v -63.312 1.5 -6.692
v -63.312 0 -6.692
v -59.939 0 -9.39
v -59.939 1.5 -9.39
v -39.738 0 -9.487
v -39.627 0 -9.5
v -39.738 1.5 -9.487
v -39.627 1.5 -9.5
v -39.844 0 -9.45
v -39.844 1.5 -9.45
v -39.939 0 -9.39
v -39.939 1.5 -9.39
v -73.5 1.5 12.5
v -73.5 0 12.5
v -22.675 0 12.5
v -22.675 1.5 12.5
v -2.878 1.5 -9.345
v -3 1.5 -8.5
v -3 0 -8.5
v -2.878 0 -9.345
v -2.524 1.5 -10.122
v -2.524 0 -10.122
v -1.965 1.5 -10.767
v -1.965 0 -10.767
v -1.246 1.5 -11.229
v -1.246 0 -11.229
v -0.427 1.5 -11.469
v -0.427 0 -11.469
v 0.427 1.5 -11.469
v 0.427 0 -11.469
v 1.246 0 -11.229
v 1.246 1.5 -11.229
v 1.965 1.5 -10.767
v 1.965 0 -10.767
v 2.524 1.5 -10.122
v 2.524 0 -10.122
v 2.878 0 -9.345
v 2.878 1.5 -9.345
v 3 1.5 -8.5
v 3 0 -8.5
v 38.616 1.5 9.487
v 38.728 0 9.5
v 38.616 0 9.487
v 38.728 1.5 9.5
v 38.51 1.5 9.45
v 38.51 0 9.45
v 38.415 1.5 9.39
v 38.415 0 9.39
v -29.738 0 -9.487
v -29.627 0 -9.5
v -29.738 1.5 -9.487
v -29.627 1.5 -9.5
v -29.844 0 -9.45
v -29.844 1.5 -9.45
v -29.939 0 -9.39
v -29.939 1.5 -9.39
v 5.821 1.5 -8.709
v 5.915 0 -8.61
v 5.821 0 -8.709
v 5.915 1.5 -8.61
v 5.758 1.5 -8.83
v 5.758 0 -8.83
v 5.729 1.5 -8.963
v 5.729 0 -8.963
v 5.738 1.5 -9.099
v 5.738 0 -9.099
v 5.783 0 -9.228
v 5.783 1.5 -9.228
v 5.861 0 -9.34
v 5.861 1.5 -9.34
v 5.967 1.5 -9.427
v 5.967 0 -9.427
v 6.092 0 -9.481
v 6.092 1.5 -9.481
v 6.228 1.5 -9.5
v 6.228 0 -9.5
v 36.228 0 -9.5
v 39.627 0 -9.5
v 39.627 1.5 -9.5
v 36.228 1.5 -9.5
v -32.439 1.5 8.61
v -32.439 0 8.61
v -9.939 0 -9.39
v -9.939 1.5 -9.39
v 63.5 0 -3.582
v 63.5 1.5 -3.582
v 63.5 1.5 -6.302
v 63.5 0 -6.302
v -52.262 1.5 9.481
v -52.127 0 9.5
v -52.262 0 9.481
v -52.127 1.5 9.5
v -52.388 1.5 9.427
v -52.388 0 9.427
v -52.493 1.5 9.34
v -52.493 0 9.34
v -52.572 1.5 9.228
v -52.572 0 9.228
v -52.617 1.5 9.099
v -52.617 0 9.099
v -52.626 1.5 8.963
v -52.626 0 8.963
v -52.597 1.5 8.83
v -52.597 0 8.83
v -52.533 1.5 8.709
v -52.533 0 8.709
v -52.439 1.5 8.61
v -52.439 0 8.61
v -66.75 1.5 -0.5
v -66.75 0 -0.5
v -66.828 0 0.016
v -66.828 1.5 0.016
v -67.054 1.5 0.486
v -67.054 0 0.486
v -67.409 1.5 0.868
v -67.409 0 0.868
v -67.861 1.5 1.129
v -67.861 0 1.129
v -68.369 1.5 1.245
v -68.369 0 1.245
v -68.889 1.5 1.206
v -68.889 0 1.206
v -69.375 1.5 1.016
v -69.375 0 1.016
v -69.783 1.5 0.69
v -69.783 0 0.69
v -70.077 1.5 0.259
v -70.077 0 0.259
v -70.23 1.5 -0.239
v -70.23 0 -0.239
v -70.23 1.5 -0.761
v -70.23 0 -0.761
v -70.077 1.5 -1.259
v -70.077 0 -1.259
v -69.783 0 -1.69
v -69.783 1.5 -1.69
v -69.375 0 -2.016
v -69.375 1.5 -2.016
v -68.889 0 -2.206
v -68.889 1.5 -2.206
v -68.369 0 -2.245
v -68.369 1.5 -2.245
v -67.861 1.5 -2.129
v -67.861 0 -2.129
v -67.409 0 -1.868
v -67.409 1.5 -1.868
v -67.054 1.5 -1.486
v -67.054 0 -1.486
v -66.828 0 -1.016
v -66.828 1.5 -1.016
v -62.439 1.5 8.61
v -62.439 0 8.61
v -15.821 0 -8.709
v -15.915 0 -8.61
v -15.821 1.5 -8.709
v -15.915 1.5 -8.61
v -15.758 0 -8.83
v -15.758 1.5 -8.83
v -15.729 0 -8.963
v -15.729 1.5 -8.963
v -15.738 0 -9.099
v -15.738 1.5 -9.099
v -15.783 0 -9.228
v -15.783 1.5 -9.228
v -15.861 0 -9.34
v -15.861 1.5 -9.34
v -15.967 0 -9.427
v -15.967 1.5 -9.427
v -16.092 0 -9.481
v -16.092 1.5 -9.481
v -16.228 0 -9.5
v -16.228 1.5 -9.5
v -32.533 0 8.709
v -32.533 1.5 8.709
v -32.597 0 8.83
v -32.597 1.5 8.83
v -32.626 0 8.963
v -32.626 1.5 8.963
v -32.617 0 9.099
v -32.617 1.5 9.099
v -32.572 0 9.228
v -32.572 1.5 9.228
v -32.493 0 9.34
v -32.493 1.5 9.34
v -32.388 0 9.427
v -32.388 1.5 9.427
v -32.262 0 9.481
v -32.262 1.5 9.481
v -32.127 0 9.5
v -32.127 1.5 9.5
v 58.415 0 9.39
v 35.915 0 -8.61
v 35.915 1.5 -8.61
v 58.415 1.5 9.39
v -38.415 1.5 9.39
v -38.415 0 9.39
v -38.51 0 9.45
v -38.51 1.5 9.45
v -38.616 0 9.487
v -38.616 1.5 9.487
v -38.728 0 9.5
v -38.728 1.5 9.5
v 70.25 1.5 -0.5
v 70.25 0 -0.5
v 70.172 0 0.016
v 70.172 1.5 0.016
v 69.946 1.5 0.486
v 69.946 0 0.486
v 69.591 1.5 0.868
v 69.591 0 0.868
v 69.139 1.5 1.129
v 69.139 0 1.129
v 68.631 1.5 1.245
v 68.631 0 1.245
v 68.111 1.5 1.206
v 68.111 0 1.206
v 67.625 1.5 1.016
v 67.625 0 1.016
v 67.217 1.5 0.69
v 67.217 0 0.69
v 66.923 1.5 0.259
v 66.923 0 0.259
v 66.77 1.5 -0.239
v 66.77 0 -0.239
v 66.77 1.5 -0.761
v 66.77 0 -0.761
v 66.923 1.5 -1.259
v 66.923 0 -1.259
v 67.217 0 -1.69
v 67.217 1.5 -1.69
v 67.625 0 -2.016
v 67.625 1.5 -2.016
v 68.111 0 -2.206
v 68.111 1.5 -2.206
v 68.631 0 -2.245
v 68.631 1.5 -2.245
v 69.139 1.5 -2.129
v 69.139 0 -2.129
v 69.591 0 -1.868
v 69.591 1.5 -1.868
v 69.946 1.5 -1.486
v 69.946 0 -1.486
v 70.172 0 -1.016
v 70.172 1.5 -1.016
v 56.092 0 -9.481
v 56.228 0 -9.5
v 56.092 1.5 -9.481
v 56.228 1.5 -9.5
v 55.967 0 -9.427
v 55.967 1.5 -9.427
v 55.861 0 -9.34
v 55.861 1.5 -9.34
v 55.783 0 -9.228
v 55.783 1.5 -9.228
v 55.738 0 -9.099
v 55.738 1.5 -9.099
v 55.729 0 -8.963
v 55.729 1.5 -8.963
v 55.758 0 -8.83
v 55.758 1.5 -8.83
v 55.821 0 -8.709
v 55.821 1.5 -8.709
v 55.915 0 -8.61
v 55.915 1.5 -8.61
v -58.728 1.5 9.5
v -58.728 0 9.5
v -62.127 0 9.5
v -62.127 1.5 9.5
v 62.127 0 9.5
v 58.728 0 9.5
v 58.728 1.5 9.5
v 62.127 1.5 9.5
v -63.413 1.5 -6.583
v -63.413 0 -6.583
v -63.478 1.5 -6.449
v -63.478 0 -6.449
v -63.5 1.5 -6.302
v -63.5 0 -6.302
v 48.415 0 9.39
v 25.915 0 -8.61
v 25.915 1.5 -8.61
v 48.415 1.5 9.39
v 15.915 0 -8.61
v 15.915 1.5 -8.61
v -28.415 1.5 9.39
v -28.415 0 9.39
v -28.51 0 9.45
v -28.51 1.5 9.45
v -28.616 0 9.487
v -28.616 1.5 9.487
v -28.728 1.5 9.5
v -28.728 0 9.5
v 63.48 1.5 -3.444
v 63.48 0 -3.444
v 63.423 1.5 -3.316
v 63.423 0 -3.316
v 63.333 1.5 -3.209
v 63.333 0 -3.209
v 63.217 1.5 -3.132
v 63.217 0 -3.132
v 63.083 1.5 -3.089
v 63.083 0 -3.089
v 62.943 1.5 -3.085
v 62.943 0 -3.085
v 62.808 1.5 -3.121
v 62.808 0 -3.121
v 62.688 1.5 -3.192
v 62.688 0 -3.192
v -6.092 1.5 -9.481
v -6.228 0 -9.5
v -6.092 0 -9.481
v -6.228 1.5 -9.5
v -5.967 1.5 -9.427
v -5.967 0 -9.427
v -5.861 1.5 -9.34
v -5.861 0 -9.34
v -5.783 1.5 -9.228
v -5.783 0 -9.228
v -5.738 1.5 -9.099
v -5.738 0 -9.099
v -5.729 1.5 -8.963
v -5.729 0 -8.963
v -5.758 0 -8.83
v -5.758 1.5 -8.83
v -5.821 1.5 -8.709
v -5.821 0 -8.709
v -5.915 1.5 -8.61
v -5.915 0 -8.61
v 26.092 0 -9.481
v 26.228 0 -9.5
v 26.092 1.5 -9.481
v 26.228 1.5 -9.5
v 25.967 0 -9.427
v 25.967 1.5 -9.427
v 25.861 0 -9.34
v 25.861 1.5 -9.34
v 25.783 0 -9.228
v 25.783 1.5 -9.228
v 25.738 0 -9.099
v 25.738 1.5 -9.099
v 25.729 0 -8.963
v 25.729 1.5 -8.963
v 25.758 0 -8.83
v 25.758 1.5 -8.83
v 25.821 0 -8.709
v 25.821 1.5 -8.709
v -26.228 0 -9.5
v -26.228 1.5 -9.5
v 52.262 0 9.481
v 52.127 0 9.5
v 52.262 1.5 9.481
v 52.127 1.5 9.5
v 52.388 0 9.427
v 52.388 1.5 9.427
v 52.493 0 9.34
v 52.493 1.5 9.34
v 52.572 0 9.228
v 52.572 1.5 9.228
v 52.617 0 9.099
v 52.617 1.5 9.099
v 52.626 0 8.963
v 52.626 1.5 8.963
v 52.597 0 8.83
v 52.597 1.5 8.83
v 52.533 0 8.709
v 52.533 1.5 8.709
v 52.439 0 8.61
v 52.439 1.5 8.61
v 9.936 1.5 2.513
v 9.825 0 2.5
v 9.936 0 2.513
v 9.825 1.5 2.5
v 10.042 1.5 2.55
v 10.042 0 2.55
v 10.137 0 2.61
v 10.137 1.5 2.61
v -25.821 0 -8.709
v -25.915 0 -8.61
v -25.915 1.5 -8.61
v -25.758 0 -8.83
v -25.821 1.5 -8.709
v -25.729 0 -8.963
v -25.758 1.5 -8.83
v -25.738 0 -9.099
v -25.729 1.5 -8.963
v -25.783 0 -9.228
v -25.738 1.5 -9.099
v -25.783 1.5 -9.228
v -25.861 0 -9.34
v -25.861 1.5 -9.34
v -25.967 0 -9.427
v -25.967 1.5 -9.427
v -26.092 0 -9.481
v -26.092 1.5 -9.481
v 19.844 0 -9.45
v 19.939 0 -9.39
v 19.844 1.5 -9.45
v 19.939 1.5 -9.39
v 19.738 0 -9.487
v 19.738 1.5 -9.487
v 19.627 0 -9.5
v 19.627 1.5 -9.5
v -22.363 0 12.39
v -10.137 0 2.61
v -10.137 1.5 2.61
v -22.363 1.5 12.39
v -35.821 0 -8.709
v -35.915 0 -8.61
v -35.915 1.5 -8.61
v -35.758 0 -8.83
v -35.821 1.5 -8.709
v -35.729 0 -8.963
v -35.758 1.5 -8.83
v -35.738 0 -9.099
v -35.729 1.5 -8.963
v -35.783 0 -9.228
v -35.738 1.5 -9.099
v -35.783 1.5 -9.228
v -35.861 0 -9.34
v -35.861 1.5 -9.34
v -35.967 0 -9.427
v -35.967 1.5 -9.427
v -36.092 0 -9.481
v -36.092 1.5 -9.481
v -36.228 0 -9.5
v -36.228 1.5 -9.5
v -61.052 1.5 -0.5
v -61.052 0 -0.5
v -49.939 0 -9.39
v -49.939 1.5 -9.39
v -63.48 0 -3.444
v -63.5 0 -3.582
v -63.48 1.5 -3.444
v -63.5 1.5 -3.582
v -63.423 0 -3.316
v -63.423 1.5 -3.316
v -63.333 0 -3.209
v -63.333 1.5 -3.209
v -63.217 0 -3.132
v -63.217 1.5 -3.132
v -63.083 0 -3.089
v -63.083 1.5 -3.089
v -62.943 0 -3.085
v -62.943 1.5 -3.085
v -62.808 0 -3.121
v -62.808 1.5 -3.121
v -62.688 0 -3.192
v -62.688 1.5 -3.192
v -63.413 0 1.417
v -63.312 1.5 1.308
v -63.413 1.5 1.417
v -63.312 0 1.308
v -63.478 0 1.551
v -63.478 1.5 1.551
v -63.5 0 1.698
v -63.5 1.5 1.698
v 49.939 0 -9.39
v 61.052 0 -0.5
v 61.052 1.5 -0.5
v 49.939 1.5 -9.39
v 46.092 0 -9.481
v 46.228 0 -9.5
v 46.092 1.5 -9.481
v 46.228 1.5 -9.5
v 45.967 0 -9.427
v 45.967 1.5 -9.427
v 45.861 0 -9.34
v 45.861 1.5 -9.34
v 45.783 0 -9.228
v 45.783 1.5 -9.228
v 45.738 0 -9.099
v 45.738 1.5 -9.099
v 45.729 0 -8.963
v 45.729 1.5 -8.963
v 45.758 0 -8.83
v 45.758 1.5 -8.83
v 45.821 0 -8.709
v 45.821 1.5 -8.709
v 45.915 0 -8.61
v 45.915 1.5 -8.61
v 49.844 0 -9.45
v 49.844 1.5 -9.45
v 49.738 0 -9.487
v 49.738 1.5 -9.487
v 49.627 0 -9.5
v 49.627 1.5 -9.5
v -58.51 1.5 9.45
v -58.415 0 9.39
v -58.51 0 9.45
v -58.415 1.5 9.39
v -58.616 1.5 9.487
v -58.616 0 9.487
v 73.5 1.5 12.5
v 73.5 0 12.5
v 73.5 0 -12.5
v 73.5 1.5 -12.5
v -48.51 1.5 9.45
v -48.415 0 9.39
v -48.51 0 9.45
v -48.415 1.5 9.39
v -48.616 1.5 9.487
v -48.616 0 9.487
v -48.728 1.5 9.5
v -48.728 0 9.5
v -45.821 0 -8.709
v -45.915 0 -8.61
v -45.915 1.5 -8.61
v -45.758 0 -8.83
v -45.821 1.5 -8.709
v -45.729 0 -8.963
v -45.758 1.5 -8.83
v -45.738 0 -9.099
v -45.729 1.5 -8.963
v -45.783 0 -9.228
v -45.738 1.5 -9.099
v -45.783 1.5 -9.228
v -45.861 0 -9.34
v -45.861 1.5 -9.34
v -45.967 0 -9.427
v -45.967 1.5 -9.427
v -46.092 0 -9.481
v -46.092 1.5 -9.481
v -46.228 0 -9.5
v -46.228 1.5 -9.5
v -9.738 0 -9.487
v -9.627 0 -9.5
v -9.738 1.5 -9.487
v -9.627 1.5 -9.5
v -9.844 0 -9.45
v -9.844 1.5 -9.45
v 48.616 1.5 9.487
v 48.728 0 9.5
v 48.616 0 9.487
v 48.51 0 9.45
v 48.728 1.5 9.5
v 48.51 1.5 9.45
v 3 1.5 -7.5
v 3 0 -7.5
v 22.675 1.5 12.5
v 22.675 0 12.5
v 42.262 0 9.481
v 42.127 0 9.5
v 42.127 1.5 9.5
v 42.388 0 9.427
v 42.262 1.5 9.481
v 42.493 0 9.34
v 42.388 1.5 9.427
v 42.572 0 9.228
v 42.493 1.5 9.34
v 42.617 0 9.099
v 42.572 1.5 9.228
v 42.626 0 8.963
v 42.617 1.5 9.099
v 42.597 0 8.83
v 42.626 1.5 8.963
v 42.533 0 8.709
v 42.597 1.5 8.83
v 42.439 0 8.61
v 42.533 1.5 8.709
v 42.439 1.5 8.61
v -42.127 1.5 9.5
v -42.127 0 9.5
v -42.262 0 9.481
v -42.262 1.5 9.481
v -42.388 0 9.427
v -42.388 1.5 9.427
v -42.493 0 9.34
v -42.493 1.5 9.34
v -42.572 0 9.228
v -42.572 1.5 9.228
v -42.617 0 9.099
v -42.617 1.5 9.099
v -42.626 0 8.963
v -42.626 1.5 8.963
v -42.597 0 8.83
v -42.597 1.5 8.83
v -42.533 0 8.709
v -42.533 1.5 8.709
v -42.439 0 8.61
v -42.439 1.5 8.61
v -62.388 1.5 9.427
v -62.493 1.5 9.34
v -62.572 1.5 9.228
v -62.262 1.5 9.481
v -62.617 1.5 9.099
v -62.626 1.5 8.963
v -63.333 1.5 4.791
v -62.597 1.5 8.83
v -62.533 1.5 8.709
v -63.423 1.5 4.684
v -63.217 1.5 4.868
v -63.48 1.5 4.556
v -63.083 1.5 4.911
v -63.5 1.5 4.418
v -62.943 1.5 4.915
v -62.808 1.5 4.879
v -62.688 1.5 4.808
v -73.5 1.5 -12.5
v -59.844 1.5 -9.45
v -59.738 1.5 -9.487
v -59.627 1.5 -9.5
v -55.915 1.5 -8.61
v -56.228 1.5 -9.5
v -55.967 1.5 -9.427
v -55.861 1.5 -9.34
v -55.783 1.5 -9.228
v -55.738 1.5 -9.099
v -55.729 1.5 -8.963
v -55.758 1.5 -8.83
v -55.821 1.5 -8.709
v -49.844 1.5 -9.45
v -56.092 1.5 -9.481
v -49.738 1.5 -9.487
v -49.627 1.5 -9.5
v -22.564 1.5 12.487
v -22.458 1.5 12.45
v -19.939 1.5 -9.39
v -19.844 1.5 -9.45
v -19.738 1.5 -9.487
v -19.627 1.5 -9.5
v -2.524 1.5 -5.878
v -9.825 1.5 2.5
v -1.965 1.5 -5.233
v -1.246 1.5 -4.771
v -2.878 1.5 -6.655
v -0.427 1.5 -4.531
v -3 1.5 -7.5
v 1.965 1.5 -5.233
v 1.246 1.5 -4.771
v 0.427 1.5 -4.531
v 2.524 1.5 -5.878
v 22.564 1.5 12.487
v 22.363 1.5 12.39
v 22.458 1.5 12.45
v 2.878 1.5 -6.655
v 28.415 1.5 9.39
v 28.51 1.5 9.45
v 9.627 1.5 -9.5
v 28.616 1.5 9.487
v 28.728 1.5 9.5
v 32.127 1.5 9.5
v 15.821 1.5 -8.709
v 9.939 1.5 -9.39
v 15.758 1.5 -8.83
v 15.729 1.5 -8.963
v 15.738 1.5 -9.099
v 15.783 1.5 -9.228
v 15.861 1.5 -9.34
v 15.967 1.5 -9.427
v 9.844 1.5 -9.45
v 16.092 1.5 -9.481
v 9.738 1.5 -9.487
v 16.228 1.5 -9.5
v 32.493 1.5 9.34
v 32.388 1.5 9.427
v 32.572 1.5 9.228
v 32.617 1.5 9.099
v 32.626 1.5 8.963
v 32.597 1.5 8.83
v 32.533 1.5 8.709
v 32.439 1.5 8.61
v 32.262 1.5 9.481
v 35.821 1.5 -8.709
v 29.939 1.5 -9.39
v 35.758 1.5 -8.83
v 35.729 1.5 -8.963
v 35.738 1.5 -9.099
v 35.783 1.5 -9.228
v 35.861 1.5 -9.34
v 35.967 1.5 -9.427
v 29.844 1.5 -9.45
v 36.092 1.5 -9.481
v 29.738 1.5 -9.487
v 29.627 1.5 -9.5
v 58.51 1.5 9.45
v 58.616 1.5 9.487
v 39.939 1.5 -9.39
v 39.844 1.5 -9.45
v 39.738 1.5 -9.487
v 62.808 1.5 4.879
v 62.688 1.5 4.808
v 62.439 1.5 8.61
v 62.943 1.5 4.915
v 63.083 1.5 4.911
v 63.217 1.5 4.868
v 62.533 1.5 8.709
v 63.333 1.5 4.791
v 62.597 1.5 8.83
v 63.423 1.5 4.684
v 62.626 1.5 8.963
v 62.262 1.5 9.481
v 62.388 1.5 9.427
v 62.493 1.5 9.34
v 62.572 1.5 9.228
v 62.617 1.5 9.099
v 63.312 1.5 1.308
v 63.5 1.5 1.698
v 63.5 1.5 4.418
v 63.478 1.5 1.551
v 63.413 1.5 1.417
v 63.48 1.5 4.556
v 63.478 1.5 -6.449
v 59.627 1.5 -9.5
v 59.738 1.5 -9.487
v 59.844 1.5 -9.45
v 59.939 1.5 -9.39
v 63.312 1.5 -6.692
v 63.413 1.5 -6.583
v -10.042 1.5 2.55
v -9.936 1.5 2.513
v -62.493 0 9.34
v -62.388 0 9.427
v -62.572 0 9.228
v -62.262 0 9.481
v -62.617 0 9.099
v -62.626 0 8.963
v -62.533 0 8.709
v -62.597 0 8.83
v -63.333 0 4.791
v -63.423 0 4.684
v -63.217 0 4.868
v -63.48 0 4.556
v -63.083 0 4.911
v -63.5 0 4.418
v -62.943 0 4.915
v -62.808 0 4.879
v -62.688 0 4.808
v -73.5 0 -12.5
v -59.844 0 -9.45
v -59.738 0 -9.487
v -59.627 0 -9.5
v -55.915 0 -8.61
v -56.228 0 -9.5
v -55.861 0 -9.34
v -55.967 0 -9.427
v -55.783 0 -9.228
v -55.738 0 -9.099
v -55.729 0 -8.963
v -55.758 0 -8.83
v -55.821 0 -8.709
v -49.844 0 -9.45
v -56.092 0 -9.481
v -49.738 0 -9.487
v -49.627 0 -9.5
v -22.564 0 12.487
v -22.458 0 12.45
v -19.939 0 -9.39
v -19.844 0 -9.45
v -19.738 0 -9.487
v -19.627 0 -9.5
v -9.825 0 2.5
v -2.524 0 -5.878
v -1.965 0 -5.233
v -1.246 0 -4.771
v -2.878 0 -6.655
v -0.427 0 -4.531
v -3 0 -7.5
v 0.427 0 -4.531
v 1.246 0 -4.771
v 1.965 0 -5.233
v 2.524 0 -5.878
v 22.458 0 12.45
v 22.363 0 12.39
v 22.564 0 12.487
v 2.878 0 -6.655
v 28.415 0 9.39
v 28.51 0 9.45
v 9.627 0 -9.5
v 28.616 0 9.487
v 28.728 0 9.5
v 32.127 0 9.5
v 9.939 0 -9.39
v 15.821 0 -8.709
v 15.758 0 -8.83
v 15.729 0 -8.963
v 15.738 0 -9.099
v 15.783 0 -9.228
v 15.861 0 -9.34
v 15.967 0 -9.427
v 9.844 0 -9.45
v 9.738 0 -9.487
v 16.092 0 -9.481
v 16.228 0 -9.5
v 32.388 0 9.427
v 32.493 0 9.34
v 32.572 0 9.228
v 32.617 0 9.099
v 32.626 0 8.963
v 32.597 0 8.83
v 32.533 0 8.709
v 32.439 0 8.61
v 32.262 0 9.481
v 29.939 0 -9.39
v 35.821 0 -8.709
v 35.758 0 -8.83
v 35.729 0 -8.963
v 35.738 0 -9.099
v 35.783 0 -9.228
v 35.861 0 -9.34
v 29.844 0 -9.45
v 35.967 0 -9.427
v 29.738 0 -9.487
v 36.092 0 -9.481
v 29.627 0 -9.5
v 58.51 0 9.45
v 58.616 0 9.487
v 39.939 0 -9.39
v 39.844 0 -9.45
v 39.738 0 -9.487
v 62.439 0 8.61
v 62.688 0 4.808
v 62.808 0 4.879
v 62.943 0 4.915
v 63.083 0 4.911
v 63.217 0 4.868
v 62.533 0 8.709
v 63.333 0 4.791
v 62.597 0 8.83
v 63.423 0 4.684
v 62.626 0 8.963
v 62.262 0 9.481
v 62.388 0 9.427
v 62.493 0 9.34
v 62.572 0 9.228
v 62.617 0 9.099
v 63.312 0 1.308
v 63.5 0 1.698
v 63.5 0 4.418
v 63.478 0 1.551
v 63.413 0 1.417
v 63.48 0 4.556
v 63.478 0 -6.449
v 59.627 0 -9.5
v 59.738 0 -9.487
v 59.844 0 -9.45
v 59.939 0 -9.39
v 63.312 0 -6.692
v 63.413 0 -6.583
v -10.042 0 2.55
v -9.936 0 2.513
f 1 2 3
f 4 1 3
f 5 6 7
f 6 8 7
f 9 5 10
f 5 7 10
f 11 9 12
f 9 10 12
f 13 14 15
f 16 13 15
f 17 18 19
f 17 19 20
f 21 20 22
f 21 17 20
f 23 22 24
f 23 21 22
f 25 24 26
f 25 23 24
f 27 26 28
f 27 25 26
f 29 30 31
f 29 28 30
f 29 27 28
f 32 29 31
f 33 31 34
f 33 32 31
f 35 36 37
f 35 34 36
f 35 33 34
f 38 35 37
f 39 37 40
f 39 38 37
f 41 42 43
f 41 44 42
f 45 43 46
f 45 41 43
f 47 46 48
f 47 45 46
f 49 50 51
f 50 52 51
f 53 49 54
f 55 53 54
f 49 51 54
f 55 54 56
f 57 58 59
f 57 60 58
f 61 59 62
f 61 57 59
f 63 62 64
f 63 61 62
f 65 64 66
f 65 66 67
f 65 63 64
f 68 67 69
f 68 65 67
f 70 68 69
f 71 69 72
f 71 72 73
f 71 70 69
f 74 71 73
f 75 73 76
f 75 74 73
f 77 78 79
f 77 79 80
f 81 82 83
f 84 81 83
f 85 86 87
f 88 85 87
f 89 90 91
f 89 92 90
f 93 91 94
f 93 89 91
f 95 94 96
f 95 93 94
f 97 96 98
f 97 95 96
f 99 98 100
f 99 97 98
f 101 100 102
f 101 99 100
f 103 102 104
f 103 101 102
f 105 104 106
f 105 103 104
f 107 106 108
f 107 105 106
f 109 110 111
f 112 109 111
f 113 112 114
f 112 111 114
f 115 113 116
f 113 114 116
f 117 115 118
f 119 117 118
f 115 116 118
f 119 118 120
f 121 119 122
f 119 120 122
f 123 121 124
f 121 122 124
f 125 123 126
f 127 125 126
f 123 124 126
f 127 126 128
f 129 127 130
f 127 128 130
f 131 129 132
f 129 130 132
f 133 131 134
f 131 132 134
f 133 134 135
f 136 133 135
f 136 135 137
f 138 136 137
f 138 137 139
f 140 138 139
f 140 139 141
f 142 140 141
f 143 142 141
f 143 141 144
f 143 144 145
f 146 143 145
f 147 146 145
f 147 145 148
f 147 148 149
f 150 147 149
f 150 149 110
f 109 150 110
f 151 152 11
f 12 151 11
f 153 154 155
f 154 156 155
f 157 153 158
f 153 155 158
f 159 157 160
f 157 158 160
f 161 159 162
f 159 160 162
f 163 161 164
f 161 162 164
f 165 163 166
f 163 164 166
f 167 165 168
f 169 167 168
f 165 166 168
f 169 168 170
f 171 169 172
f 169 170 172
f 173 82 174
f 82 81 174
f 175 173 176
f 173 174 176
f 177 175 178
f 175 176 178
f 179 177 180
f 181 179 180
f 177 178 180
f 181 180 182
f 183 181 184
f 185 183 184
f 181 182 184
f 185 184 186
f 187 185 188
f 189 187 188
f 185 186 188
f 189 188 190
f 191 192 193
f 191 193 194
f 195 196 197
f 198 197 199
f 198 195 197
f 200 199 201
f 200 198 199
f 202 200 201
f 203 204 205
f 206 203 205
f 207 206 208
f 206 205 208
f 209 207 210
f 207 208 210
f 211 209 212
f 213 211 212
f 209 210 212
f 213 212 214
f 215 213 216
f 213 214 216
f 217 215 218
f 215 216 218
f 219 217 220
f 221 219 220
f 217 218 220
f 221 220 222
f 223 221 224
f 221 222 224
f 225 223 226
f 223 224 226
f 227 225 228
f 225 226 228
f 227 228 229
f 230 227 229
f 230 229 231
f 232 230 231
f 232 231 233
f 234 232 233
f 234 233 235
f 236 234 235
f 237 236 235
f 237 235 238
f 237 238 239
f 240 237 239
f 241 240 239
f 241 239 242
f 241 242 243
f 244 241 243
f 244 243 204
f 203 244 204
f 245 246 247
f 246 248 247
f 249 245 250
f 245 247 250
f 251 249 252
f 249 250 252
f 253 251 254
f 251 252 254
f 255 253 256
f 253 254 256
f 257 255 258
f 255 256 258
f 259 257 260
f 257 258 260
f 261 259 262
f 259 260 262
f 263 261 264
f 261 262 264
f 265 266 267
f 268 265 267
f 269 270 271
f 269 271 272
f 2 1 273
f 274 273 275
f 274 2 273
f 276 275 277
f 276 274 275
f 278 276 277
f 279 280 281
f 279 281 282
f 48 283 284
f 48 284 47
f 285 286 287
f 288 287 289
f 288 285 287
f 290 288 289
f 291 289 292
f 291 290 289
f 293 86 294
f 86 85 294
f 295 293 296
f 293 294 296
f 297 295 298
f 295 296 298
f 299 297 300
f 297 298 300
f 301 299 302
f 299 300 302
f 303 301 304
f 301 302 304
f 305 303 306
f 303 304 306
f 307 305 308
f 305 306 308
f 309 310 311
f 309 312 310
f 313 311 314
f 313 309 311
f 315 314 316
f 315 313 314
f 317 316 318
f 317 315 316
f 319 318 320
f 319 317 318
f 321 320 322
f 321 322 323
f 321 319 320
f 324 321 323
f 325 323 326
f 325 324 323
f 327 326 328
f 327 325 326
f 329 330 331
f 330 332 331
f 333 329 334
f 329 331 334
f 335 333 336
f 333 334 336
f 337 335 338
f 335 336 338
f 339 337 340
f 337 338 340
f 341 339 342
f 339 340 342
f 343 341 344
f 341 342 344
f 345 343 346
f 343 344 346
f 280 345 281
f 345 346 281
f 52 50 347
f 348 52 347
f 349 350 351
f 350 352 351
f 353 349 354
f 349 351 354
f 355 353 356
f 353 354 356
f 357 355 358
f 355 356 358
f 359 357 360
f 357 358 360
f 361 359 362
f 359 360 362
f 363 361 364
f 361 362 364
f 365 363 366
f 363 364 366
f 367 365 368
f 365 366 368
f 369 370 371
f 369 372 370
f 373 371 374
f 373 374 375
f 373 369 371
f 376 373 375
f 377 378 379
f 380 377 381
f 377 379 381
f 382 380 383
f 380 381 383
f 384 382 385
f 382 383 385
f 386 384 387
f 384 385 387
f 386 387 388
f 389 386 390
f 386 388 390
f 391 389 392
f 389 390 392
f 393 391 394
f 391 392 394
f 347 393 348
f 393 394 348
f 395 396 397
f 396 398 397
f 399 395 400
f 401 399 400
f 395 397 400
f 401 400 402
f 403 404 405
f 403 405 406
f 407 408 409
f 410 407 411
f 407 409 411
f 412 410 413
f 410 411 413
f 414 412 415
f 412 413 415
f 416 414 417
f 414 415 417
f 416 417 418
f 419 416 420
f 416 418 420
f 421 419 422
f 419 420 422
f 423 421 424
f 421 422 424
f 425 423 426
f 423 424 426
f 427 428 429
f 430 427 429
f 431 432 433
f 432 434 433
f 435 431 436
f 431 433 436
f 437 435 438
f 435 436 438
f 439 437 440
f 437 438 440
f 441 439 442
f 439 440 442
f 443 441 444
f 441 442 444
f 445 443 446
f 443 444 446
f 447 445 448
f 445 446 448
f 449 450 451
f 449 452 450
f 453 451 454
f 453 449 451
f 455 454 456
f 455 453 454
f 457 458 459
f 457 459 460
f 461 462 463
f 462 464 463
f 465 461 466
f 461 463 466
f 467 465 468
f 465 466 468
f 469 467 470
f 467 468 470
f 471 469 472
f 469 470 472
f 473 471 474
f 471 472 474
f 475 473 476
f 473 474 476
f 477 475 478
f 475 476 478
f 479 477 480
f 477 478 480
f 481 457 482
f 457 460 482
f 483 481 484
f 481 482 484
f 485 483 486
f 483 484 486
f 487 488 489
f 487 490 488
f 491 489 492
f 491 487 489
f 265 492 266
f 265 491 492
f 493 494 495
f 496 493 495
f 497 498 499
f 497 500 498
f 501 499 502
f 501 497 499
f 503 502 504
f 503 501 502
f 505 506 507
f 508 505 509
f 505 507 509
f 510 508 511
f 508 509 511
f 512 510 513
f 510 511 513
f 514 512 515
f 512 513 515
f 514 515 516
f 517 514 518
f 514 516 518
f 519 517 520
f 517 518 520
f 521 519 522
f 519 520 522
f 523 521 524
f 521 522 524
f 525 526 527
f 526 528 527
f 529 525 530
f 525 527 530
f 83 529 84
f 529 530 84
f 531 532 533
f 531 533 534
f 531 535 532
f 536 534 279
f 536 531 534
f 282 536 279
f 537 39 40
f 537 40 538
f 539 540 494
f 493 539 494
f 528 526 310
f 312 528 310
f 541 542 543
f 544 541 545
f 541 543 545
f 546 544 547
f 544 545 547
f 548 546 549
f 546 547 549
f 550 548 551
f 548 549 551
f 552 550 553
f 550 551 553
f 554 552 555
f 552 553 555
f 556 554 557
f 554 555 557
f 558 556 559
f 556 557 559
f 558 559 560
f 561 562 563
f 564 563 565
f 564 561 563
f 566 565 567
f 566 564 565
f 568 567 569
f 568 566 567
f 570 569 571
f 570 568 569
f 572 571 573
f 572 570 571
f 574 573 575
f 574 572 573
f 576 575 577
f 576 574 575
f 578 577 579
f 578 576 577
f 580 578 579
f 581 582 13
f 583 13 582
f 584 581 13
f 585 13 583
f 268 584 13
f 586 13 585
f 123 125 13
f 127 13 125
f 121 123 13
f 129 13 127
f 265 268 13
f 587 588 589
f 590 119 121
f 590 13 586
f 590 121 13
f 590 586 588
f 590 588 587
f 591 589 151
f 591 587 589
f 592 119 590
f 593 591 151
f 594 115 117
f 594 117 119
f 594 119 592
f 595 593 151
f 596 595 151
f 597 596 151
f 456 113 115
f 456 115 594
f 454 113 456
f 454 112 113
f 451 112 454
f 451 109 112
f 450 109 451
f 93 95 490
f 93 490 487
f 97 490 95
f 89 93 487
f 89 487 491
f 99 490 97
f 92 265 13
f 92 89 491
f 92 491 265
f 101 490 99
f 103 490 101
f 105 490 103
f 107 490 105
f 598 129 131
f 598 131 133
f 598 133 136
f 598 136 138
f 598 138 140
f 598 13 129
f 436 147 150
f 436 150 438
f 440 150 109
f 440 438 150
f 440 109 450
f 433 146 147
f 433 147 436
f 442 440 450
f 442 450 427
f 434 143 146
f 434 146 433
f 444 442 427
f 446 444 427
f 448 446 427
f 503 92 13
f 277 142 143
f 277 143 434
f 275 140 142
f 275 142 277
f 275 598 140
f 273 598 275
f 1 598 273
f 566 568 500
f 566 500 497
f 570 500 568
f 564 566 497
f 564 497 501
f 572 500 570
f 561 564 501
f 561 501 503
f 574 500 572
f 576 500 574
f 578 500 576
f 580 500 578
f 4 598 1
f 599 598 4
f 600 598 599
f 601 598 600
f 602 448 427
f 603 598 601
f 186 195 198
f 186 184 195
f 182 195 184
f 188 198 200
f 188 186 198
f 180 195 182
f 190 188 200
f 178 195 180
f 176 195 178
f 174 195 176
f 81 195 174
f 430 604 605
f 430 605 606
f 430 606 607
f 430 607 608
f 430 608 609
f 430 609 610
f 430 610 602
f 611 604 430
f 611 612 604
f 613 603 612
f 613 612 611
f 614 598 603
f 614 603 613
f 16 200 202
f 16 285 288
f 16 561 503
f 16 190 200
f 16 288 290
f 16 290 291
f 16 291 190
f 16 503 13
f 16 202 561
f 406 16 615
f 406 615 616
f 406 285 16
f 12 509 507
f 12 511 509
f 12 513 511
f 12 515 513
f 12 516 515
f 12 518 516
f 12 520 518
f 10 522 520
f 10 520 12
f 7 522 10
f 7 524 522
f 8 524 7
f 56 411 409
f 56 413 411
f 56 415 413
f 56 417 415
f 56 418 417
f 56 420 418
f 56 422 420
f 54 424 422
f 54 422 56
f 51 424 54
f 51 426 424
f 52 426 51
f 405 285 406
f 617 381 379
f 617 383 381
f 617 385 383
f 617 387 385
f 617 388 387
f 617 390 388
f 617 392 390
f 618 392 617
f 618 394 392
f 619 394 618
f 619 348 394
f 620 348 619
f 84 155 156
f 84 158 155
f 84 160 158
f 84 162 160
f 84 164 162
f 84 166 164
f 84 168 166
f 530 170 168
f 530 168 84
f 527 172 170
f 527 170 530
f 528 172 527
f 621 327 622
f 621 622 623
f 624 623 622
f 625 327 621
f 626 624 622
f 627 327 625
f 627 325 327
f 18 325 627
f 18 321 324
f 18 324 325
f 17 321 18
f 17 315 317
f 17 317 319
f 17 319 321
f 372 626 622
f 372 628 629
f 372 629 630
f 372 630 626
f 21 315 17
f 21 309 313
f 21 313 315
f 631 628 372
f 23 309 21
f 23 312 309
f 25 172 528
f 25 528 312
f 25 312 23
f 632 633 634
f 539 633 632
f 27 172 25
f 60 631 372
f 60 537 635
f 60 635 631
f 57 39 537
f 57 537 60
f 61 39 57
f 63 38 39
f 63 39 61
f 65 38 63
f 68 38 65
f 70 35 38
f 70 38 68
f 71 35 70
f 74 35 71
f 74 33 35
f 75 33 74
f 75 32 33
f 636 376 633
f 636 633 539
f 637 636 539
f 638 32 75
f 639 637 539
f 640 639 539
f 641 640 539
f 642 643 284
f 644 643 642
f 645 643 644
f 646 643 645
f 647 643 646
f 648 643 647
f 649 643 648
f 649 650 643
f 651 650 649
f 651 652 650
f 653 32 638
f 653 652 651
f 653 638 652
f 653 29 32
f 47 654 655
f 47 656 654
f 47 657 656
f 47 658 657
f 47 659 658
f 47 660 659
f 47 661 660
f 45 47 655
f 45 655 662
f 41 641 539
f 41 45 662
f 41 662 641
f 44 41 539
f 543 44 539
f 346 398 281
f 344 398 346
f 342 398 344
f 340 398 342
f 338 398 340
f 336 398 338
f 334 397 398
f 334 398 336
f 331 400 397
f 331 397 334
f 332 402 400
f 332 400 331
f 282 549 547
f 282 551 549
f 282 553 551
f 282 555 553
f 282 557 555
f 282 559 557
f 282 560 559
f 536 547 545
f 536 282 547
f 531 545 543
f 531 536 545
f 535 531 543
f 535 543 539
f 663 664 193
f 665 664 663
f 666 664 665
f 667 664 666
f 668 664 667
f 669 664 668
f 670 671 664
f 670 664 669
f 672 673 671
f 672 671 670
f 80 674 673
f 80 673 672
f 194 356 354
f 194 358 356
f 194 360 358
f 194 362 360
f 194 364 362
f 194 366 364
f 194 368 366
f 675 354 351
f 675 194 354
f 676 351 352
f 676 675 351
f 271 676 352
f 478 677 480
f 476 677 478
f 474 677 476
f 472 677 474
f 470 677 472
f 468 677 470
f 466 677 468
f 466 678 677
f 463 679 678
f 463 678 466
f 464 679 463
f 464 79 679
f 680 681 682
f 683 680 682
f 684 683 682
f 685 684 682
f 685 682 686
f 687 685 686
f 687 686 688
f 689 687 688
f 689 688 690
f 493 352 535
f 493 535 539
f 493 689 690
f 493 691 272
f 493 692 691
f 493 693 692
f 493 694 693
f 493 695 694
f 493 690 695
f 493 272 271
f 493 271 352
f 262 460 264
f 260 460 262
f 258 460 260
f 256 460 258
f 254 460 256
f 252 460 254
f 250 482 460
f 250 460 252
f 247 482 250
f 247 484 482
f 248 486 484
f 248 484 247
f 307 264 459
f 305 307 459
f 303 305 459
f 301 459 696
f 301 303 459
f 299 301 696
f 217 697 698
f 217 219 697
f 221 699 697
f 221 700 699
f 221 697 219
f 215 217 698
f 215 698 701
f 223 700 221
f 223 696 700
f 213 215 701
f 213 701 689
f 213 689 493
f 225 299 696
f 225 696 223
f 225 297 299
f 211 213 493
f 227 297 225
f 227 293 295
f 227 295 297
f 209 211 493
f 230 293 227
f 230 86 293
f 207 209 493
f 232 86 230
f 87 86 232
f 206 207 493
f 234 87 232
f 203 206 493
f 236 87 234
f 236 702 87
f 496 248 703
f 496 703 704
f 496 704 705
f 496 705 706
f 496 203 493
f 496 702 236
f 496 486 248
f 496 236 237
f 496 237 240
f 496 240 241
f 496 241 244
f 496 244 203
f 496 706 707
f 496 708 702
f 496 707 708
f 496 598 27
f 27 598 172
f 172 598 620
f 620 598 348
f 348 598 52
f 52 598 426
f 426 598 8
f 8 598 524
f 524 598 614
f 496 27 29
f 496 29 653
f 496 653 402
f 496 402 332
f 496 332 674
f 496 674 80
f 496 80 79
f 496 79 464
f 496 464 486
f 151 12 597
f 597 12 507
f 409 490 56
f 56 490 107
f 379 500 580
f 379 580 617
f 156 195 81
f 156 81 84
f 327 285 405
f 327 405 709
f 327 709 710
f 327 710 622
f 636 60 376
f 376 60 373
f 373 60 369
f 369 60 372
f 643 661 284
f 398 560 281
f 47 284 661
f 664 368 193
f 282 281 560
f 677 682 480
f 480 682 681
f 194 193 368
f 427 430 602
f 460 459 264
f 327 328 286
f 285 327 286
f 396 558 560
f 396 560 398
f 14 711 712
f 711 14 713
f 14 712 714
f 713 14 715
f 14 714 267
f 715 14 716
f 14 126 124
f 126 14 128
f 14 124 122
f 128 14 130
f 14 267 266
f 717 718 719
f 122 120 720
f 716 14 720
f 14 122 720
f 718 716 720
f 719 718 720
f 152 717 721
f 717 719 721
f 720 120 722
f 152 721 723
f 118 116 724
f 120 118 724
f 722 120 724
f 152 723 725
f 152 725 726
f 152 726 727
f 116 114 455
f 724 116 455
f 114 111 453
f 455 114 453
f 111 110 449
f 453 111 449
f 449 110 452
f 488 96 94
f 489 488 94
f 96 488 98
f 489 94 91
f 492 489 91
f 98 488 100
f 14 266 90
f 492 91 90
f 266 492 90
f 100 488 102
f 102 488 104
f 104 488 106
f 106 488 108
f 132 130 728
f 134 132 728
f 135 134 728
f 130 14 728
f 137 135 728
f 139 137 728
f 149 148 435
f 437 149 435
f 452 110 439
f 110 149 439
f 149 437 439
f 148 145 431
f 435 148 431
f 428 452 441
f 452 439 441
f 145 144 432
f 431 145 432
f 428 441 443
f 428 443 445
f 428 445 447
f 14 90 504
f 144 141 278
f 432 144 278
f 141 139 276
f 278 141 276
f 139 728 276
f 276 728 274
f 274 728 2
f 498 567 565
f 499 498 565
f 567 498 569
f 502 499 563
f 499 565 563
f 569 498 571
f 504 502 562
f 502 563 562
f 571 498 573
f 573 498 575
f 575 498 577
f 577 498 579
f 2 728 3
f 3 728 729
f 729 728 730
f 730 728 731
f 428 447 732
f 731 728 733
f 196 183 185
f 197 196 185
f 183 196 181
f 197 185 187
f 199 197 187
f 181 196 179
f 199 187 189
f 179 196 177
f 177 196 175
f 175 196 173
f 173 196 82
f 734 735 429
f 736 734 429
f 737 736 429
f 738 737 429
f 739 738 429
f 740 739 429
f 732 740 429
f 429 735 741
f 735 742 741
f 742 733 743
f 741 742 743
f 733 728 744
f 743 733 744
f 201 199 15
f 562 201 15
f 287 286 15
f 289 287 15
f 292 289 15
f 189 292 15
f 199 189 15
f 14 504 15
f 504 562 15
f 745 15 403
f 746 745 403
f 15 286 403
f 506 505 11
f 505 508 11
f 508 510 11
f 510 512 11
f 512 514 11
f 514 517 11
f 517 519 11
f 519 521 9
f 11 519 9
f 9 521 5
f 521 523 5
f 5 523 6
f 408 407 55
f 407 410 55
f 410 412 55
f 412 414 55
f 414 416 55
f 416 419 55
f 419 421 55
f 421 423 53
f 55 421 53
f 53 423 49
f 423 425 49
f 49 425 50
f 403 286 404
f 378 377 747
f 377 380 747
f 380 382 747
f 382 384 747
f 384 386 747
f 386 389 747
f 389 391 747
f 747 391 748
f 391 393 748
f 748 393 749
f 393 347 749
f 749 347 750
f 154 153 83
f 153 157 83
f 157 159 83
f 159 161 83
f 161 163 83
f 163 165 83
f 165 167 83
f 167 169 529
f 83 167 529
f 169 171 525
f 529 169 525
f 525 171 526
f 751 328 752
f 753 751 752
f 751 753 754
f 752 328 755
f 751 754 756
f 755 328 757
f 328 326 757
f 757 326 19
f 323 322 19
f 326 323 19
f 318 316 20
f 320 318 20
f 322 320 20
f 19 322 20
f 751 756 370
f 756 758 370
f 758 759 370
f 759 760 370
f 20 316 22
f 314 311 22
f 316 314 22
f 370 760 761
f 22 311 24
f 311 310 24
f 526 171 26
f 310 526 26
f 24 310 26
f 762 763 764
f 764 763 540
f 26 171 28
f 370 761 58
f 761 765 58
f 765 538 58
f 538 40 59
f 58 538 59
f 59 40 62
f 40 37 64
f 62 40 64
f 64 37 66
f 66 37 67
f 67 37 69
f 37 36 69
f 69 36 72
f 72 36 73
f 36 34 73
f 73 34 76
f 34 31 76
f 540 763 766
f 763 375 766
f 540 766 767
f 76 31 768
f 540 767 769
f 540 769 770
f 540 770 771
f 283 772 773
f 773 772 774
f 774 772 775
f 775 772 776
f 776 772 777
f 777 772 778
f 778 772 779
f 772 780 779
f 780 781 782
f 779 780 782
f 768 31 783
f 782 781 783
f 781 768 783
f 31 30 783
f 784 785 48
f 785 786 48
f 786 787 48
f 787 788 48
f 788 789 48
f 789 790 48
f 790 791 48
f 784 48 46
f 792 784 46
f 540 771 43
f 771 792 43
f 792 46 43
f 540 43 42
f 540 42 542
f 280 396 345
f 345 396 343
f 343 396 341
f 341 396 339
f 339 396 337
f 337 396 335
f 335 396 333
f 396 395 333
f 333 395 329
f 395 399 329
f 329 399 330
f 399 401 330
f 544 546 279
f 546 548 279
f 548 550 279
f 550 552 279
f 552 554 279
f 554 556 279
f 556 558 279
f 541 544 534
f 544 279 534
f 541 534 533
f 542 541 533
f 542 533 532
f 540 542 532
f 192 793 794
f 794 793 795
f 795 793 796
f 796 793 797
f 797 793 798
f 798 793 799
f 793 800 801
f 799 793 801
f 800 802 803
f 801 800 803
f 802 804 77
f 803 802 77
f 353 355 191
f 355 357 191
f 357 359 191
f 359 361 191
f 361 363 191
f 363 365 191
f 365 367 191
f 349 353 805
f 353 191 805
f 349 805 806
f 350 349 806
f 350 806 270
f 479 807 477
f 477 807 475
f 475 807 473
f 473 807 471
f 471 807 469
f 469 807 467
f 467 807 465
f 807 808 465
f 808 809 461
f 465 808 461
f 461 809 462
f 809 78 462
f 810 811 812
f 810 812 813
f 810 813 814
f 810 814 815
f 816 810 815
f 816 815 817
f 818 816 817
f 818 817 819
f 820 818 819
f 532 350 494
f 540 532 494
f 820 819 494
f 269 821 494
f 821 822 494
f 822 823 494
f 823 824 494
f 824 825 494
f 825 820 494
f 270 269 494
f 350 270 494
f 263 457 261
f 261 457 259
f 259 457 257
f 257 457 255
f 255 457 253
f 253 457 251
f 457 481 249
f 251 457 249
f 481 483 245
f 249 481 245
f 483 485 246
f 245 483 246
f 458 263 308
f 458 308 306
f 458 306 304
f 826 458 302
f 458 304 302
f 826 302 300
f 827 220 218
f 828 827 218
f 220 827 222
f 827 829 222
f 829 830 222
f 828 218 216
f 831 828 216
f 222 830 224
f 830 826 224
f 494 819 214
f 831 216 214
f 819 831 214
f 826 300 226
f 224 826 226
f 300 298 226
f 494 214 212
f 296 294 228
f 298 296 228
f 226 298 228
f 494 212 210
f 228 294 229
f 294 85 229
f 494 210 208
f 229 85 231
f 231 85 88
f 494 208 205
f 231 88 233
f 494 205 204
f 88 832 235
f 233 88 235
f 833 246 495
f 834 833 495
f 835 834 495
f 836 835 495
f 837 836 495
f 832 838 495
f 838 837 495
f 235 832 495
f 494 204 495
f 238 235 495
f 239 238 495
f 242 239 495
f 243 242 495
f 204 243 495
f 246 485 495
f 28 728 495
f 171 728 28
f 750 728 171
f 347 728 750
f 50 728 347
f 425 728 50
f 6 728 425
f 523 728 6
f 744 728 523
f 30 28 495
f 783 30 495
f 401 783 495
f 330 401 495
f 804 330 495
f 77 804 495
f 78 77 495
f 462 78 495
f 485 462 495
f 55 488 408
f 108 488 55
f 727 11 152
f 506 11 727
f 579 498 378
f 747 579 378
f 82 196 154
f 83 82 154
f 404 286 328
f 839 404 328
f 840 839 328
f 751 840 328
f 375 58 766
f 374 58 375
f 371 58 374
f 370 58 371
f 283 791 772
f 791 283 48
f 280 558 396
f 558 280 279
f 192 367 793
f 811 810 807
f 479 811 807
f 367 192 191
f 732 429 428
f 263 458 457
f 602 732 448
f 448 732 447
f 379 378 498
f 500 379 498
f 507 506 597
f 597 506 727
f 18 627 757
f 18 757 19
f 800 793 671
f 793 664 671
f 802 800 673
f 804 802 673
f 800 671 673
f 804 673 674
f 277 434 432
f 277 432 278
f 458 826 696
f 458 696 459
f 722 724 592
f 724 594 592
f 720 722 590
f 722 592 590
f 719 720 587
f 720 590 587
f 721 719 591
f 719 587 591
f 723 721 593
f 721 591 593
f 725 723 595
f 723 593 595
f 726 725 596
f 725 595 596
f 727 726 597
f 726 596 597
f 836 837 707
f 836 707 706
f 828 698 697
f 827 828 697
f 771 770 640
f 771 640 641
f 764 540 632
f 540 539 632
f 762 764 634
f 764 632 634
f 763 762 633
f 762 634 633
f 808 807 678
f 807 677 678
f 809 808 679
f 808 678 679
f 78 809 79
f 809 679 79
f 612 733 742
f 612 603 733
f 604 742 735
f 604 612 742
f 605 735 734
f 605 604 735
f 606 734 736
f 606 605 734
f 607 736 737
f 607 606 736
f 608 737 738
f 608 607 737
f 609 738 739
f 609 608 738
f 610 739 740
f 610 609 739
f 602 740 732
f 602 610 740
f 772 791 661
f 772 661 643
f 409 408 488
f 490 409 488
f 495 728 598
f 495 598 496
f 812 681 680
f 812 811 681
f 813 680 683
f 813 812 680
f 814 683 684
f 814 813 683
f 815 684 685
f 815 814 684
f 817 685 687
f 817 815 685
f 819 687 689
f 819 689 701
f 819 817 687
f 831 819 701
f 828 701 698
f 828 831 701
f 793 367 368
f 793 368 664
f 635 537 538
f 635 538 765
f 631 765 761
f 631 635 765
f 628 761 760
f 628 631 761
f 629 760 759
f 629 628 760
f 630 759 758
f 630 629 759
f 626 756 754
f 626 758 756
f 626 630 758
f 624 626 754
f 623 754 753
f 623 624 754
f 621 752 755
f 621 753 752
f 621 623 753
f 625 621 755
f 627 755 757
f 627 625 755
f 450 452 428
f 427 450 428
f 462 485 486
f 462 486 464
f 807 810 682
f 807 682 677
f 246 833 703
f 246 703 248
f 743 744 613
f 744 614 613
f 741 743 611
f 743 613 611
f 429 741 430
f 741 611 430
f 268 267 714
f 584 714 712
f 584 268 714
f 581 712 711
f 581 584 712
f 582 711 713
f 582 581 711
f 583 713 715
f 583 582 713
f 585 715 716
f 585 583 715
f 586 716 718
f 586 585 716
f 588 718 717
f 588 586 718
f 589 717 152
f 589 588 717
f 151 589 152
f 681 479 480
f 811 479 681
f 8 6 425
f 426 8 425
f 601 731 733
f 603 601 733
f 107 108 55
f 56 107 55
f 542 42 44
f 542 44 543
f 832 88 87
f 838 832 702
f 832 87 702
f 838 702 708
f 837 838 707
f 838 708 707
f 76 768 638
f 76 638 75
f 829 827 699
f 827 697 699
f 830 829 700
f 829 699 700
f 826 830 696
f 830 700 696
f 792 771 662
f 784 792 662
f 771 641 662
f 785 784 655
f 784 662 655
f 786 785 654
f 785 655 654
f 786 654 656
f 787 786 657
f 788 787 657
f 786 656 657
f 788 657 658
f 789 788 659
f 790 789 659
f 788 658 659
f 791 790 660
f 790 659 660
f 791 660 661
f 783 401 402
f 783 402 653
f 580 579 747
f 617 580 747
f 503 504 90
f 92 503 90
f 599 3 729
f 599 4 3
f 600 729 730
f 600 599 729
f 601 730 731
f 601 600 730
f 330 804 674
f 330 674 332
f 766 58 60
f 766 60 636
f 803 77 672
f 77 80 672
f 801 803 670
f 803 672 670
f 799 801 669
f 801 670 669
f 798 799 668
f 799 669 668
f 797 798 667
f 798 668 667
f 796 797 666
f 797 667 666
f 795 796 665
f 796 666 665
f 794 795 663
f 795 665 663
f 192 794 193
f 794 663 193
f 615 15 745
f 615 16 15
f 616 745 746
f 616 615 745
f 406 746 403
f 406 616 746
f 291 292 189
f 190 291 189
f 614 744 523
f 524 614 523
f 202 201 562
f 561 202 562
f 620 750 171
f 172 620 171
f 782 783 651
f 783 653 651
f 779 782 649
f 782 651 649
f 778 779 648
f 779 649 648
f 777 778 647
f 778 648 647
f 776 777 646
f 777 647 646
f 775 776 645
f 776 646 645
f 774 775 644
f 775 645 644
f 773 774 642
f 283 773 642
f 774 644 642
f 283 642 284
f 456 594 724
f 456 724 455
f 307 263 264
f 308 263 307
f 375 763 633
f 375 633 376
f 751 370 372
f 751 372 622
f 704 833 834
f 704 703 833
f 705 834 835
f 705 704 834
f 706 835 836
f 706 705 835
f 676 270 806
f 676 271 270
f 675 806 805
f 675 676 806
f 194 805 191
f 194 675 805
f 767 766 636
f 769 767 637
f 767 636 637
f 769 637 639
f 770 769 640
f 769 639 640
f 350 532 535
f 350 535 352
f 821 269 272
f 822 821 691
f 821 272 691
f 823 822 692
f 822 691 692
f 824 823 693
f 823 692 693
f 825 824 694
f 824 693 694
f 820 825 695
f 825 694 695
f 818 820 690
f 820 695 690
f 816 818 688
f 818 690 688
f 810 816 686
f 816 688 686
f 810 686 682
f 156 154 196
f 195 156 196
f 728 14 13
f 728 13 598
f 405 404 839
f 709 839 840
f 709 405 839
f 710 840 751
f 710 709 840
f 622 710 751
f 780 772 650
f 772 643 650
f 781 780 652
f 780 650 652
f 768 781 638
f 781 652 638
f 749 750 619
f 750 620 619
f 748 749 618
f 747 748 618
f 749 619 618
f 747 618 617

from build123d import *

# Parameters (mm, degrees)
SKETCH_1_W          = 147
SKETCH_1_H          = 25
EXTRUDE_1_DEPTH     = 1.5
CUT_EXTRUDE_1_DEPTH = 2.5
CUT_EXTRUDE_2_DEPTH = 10
FILLET_2_R          = 0.5
SKETCH_4_W          = 10
SKETCH_4_H          = 25
EXTRUDE_2_DEPTH     = 1.5
FILLET_3_R          = 0.5
SKETCH_5_R          = 1.75
CUT_EXTRUDE_3_DEPTH = 2.5
CUT_EXTRUDE_4_DEPTH = 2.5


with BuildPart() as part:
    # 草图1 → 凸台-拉伸1 (new body)
    with BuildSketch(Plane(origin=(0, 0, 0), x_dir=(1, 0, 0), z_dir=(0, 1, 0))):
        Rectangle(SKETCH_1_W, SKETCH_1_H)
    extrude(amount=EXTRUDE_1_DEPTH)

    # 草图2 → 切除-拉伸1 (cut, through all)
    with BuildSketch(Plane.XZ):
        Polygon((10, 2.5), (-10, 2.5), (-22.5, 12.5), (22.5, 12.5), align=None)
    extrude(amount=-CUT_EXTRUDE_1_DEPTH, mode=Mode.SUBTRACT)

    # 草图3 → 切除-拉伸2 (cut)
    with BuildSketch(Plane.XZ):
        Polygon((-4.802343178, -9.5), (-16.052343178, -0.5), (-28.552343178, 9.5), (-33.552343178, 9.5), (-21.052343178, -0.5), (-9.802343178, -9.5), align=None)
        Polygon((-26.052343178, -0.5), (-38.552343178, 9.5), (-43.552343178, 9.5), (-31.052343178, -0.5), (-19.802343178, -9.5), (-14.802343178, -9.5), align=None)
        Polygon((-36.052343178, -0.5), (-48.552343178, 9.5), (-53.552343178, 9.5), (-41.052343178, -0.5), (-29.802343178, -9.5), (-24.802343178, -9.5), align=None)
        Polygon((-46.052343178, -0.5), (-58.552343178, 9.5), (-63.552343178, 9.5), (-51.052343178, -0.5), (-39.802343178, -9.5), (-34.802343178, -9.5), align=None)
        Polygon((-56.052343178, -0.5), (-68.552343178, 9.5), (-70.5, 9.5), (-70.5, 7.058125458), (-61.052343178, -0.5), (-49.802343178, -9.5), (-44.802343178, -9.5), align=None)
        Polygon((-59.802343178, -9.5), (-54.802343178, -9.5), (-66.052343178, -0.5), (-70.5, 3.058125458), (-70.5, -0.941874542), align=None)
        Polygon((-70.5, -9.5), (-64.802343178, -9.5), (-70.5, -4.941874542), align=None)
    cut_extrude_2 = extrude(amount=-CUT_EXTRUDE_2_DEPTH, mode=Mode.SUBTRACT)

    # 镜向3: 切除-拉伸2 across plane
    add(cut_extrude_2.mirror(Plane(origin=(0, 0, 0), x_dir=(0, 0, 1), z_dir=(1, 0, 0))), mode=Mode.SUBTRACT)

    # 圆角2
    fillet_2_edges = [part.edges().sort_by_distance(p)[0] for p in [
        (-70.5, 0.75, -0.941874542),
        (-70.5, 0.75, 3.058125458),
        (-54.802343178, 0.75, -9.5),
        (-59.802343178, 0.75, -9.5),
        (-9.802343178, 0.75, -9.5),
        (-33.552343178, 0.75, 9.5),
        (-28.552343178, 0.75, 9.5),
        (-4.802343178, 0.75, -9.5),
        (22.5, 0.75, 12.5),
        (10, 0.75, 2.5),
        (-10, 0.75, 2.5),
        (-22.5, 0.75, 12.5),
        (63.552343178, 0.75, 9.5),
        (39.802343178, 0.75, -9.5),
        (34.802343178, 0.75, -9.5),
        (58.552343178, 0.75, 9.5),
        (70.5, 0.75, 7.058125458),
        (49.802343178, 0.75, -9.5),
        (44.802343178, 0.75, -9.5),
        (68.552343178, 0.75, 9.5),
        (70.5, 0.75, 9.5),
        (43.552343178, 0.75, 9.5),
        (19.802343178, 0.75, -9.5),
        (14.802343178, 0.75, -9.5),
        (38.552343178, 0.75, 9.5),
        (53.552343178, 0.75, 9.5),
        (29.802343178, 0.75, -9.5),
        (24.802343178, 0.75, -9.5),
        (48.552343178, 0.75, 9.5),
        (64.802343178, 0.75, -9.5),
        (70.5, 0.75, -4.941874542),
        (70.5, 0.75, -9.5),
        (70.5, 0.75, 3.058125458),
        (70.5, 0.75, -0.941874542),
        (59.802343178, 0.75, -9.5),
        (54.802343178, 0.75, -9.5),
        (33.552343178, 0.75, 9.5),
        (9.802343178, 0.75, -9.5),
        (4.802343178, 0.75, -9.5),
        (28.552343178, 0.75, 9.5),
        (-39.802343178, 0.75, -9.5),
        (-63.552343178, 0.75, 9.5),
        (-58.552343178, 0.75, 9.5),
        (-34.802343178, 0.75, -9.5),
        (-49.802343178, 0.75, -9.5),
        (-70.5, 0.75, 7.058125458),
        (-70.5, 0.75, 9.5),
        (-68.552343178, 0.75, 9.5),
        (-44.802343178, 0.75, -9.5),
        (73.5, 0.75, 12.5),
        (-19.802343178, 0.75, -9.5),
        (-73.5, 0.75, 12.5),
        (-43.552343178, 0.75, 9.5),
        (-38.552343178, 0.75, 9.5),
        (-14.802343178, 0.75, -9.5),
        (-73.5, 0.75, -12.5),
        (73.5, 0.75, -12.5),
        (-29.802343178, 0.75, -9.5),
        (-53.552343178, 0.75, 9.5),
        (-48.552343178, 0.75, 9.5),
        (-24.802343178, 0.75, -9.5),
        (-70.5, 0.75, -4.941874542),
        (-64.802343178, 0.75, -9.5),
        (-70.5, 0.75, -9.5),
    ]]
    fillet(fillet_2_edges, radius=FILLET_2_R)

    # 草图4 → 凸台-拉伸2 (add)
    with BuildSketch(Plane(origin=(0, 1.5, 0), x_dir=(1, 0, 0), z_dir=(0, 1, 0))):
        with Locations((68.5, 0)):
            Rectangle(SKETCH_4_W, SKETCH_4_H)
    extrude_2 = extrude(amount=-EXTRUDE_2_DEPTH)

    # 镜向4: 凸台-拉伸2 across plane
    add(extrude_2.mirror(Plane(origin=(0, 0, 0), x_dir=(0, 0, 1), z_dir=(1, 0, 0))))

    # 圆角3
    fillet_3_edges = [part.edges().sort_by_distance(p)[0] for p in [
        (63.5, 0.75, 5.458125458),
        (63.5, 0.75, -6.541874542),
        (63.5, 0.75, -2.541874542),
        (63.5, 0.75, 1.458125458),
        (-63.5, 0.75, 5.458125458),
        (-63.5, 0.75, -2.541874542),
        (-63.5, 0.75, 1.458125458),
        (-63.5, 0.75, -6.541874542),
    ]]
    fillet(fillet_3_edges, radius=FILLET_3_R)

    # 草图5 → 切除-拉伸3 (cut, through all)
    with BuildSketch(Plane.XZ):
        with Locations((-68.5, -0.5)):
            Circle(SKETCH_5_R)
        with Locations((68.5, -0.5)):
            Circle(SKETCH_5_R)
    extrude(amount=-CUT_EXTRUDE_3_DEPTH, mode=Mode.SUBTRACT)

    # 草图6 → 切除-拉伸4 (cut, through all)
    with BuildSketch(Plane(origin=(0, 1.5, 0), x_dir=(1, 0, 0), z_dir=(0, 1, 0))):
        with BuildLine():
            Line((3, 8.5), (3, 7.5))
            ThreePointArc((3, 7.5), (0, 4.5), (-3, 7.5))
            Line((-3, 7.5), (-3, 8.5))
            ThreePointArc((-3, 8.5), (0, 11.5), (3, 8.5))
        make_face()
    extrude(amount=-CUT_EXTRUDE_4_DEPTH, mode=Mode.SUBTRACT)


solid = part.part
